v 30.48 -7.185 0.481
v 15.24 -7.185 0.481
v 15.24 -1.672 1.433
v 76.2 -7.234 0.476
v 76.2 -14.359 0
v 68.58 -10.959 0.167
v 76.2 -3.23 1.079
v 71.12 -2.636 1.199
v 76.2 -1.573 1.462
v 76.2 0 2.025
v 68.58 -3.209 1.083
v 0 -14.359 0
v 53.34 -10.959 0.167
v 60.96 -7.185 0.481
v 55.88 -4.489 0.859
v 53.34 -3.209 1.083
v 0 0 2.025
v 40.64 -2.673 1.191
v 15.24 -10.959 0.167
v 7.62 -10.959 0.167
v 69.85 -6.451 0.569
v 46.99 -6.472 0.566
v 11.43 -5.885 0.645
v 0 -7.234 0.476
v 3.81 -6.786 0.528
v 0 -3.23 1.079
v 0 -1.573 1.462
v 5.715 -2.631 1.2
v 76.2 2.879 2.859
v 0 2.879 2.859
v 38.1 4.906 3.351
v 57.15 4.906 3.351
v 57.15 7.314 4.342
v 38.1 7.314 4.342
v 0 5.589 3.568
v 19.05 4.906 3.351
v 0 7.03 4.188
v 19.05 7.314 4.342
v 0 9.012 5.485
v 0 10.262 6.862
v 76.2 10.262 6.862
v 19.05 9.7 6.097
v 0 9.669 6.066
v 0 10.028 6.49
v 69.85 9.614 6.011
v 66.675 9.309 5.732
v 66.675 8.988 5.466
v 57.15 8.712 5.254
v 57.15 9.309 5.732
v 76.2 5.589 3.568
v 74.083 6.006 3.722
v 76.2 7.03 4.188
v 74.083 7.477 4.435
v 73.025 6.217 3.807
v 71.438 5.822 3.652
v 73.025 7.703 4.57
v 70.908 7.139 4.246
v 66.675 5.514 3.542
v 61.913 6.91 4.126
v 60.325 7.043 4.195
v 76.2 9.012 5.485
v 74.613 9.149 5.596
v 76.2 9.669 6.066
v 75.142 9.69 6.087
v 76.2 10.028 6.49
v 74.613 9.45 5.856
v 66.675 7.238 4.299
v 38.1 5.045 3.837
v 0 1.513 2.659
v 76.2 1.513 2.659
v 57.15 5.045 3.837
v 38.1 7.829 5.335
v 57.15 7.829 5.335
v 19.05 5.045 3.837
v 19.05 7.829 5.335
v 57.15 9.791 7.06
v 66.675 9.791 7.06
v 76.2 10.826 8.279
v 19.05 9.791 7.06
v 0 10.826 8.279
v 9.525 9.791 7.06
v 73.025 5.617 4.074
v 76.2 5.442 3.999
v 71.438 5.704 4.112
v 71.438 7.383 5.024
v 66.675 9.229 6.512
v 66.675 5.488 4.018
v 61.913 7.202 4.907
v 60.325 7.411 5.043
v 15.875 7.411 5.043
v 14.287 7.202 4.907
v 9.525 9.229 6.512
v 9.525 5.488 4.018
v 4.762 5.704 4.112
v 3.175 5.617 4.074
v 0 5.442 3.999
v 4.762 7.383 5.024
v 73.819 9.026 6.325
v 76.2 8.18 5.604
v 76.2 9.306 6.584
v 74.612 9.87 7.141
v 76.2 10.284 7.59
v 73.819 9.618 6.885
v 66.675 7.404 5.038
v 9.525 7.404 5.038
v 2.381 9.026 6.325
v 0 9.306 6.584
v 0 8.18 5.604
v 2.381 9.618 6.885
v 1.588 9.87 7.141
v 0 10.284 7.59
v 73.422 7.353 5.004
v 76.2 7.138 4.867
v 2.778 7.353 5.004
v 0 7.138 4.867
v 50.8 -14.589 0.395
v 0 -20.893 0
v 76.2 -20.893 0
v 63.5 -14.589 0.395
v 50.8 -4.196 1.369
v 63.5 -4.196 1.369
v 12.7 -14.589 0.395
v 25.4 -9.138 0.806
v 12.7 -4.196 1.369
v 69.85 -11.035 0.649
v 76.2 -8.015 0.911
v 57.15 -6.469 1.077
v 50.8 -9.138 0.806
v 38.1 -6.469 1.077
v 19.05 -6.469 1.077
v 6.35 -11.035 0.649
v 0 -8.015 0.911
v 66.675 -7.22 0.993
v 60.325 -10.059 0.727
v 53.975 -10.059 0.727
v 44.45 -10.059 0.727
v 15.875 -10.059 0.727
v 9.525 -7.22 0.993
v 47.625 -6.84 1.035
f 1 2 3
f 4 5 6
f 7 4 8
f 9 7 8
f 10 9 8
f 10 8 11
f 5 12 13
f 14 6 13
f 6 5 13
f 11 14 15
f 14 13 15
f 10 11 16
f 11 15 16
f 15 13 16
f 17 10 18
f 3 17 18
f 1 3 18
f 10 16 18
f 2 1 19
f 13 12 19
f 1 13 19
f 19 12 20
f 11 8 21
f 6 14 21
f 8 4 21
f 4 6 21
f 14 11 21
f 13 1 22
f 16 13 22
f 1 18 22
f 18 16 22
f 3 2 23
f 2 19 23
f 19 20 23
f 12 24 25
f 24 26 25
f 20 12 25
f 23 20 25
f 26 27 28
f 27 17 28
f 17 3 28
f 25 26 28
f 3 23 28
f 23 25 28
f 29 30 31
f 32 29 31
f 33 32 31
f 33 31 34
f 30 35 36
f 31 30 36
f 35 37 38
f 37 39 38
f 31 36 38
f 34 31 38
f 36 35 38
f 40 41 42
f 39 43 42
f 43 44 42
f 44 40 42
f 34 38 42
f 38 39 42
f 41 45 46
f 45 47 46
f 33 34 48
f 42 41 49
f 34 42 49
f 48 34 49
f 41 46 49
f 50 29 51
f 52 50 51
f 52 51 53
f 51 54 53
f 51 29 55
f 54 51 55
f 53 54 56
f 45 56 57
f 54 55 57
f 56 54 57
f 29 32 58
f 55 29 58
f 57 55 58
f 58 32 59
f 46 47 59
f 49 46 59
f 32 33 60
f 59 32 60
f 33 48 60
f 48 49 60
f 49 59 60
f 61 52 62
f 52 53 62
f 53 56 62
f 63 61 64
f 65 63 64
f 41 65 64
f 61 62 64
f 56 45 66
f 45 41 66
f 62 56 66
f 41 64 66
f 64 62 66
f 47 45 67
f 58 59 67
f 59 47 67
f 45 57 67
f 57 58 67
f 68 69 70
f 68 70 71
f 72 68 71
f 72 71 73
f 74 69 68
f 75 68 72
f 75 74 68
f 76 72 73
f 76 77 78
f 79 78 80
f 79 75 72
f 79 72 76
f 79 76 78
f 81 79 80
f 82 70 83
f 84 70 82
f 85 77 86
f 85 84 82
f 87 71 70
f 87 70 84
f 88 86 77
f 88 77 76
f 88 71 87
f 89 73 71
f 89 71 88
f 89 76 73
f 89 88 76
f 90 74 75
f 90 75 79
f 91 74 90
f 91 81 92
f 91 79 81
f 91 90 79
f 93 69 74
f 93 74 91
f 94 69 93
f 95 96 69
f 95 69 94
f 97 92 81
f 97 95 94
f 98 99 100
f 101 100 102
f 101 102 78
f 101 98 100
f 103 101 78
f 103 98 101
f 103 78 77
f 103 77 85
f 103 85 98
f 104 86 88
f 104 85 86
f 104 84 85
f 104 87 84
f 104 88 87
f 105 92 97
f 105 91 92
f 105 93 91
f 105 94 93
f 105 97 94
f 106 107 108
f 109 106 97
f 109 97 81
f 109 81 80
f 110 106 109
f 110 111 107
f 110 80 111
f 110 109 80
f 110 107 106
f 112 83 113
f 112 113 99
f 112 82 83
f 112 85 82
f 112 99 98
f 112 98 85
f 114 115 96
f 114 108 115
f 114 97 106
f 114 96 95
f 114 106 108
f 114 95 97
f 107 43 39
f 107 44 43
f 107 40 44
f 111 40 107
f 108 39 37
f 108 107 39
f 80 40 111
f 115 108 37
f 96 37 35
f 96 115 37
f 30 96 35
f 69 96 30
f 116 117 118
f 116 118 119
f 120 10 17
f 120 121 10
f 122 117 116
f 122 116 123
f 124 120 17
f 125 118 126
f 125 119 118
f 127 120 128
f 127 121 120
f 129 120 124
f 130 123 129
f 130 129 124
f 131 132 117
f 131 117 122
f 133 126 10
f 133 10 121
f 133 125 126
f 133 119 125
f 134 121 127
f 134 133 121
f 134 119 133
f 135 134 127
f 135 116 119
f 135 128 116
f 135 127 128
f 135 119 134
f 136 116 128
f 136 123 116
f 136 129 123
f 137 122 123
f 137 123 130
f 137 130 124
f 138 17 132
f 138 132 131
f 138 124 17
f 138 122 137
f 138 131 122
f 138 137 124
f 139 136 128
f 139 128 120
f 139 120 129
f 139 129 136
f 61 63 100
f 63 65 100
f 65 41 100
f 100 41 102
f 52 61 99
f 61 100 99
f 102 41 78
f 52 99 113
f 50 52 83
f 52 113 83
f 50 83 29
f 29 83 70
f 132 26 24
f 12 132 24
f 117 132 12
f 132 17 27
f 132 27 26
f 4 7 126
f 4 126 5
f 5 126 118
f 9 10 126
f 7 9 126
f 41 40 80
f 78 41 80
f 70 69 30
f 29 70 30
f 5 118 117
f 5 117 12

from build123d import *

# Parameters (mm, degrees)
F2_DEPTH = 76.2
F3_DEPTH = 76.2


with BuildPart() as f2:
    # F0 (on Right) → F2 (new body)
    with BuildSketch(Plane.YZ):
        with BuildLine():
            add(Edge.make_bspline(
                [(-20.8933241665, 0), (-16.5957920473, 0.2618400599), (-9.4152230469, 0.6993378063), (-4.0285886841, 1.3634060629), (-1.2735477229, 1.8161906645), (0, 2.0254952833)],
                knots=[0, 0, 0, 0, 0.4449280736, 0.74341195, 1, 1, 1, 1], degree=3))
            Line((-20.8933241665, 0), (-14.3593754619, 0))
            add(Edge.make_bspline(
                [(-14.3593754619, 0), (-13.3347647697, 0.0429284476), (-11.1668279383, 0.1337592025), (-7.1836818354, 0.4373909917), (-4.2718408429, 0.8798975725), (-1.683453406, 1.3580491642), (-0.5254279612, 1.8171765664), (0, 2.0254952833)],
                knots=[0, 0, 0, 0, 0.2115027062, 0.4475109525, 0.6530627628, 0.8425850434, 1, 1, 1, 1], degree=3))
        make_face()
    extrude(amount=F2_DEPTH)


with BuildPart() as f3:
    # F1 (on Right) → F3 (new body)
    with BuildSketch(Plane.YZ):
        with BuildLine():
            add(Edge.make_bspline(
                [(1.5127130318, 2.6591736823), (2.7364566117, 3.03368933), (5.0877174845, 3.7532714412), (7.8124899968, 5.1143543324), (10.1817089845, 7.3960807365), (10.6546288532, 8.0443418411), (10.8260121197, 8.2792676985)],
                knots=[0, 0, 0, 0, 0.2966166535, 0.5699095325, 0.8441378464, 1, 1, 1, 1], degree=3))
            Line((1.5127130318, 2.6591736823), (2.8787299525, 2.8593195602))
            add(Edge.make_bspline(
                [(2.8787299525, 2.8593195602), (3.5485942869, 3.0054688519), (4.9667844391, 3.3148859614), (7.3079096451, 4.1736985069), (9.7433961584, 5.9808127912), (10.1244218897, 6.6280255994), (10.2621791884, 6.8620210513)],
                knots=[0, 0, 0, 0, 0.251047114, 0.5314994792, 0.8306167775, 1, 1, 1, 1], degree=3))
            Line((10.2621791884, 6.8620210513), (10.8260121197, 8.2792676985))
        make_face()
    extrude(amount=F3_DEPTH)


solid = Compound([f2.part, f3.part])
